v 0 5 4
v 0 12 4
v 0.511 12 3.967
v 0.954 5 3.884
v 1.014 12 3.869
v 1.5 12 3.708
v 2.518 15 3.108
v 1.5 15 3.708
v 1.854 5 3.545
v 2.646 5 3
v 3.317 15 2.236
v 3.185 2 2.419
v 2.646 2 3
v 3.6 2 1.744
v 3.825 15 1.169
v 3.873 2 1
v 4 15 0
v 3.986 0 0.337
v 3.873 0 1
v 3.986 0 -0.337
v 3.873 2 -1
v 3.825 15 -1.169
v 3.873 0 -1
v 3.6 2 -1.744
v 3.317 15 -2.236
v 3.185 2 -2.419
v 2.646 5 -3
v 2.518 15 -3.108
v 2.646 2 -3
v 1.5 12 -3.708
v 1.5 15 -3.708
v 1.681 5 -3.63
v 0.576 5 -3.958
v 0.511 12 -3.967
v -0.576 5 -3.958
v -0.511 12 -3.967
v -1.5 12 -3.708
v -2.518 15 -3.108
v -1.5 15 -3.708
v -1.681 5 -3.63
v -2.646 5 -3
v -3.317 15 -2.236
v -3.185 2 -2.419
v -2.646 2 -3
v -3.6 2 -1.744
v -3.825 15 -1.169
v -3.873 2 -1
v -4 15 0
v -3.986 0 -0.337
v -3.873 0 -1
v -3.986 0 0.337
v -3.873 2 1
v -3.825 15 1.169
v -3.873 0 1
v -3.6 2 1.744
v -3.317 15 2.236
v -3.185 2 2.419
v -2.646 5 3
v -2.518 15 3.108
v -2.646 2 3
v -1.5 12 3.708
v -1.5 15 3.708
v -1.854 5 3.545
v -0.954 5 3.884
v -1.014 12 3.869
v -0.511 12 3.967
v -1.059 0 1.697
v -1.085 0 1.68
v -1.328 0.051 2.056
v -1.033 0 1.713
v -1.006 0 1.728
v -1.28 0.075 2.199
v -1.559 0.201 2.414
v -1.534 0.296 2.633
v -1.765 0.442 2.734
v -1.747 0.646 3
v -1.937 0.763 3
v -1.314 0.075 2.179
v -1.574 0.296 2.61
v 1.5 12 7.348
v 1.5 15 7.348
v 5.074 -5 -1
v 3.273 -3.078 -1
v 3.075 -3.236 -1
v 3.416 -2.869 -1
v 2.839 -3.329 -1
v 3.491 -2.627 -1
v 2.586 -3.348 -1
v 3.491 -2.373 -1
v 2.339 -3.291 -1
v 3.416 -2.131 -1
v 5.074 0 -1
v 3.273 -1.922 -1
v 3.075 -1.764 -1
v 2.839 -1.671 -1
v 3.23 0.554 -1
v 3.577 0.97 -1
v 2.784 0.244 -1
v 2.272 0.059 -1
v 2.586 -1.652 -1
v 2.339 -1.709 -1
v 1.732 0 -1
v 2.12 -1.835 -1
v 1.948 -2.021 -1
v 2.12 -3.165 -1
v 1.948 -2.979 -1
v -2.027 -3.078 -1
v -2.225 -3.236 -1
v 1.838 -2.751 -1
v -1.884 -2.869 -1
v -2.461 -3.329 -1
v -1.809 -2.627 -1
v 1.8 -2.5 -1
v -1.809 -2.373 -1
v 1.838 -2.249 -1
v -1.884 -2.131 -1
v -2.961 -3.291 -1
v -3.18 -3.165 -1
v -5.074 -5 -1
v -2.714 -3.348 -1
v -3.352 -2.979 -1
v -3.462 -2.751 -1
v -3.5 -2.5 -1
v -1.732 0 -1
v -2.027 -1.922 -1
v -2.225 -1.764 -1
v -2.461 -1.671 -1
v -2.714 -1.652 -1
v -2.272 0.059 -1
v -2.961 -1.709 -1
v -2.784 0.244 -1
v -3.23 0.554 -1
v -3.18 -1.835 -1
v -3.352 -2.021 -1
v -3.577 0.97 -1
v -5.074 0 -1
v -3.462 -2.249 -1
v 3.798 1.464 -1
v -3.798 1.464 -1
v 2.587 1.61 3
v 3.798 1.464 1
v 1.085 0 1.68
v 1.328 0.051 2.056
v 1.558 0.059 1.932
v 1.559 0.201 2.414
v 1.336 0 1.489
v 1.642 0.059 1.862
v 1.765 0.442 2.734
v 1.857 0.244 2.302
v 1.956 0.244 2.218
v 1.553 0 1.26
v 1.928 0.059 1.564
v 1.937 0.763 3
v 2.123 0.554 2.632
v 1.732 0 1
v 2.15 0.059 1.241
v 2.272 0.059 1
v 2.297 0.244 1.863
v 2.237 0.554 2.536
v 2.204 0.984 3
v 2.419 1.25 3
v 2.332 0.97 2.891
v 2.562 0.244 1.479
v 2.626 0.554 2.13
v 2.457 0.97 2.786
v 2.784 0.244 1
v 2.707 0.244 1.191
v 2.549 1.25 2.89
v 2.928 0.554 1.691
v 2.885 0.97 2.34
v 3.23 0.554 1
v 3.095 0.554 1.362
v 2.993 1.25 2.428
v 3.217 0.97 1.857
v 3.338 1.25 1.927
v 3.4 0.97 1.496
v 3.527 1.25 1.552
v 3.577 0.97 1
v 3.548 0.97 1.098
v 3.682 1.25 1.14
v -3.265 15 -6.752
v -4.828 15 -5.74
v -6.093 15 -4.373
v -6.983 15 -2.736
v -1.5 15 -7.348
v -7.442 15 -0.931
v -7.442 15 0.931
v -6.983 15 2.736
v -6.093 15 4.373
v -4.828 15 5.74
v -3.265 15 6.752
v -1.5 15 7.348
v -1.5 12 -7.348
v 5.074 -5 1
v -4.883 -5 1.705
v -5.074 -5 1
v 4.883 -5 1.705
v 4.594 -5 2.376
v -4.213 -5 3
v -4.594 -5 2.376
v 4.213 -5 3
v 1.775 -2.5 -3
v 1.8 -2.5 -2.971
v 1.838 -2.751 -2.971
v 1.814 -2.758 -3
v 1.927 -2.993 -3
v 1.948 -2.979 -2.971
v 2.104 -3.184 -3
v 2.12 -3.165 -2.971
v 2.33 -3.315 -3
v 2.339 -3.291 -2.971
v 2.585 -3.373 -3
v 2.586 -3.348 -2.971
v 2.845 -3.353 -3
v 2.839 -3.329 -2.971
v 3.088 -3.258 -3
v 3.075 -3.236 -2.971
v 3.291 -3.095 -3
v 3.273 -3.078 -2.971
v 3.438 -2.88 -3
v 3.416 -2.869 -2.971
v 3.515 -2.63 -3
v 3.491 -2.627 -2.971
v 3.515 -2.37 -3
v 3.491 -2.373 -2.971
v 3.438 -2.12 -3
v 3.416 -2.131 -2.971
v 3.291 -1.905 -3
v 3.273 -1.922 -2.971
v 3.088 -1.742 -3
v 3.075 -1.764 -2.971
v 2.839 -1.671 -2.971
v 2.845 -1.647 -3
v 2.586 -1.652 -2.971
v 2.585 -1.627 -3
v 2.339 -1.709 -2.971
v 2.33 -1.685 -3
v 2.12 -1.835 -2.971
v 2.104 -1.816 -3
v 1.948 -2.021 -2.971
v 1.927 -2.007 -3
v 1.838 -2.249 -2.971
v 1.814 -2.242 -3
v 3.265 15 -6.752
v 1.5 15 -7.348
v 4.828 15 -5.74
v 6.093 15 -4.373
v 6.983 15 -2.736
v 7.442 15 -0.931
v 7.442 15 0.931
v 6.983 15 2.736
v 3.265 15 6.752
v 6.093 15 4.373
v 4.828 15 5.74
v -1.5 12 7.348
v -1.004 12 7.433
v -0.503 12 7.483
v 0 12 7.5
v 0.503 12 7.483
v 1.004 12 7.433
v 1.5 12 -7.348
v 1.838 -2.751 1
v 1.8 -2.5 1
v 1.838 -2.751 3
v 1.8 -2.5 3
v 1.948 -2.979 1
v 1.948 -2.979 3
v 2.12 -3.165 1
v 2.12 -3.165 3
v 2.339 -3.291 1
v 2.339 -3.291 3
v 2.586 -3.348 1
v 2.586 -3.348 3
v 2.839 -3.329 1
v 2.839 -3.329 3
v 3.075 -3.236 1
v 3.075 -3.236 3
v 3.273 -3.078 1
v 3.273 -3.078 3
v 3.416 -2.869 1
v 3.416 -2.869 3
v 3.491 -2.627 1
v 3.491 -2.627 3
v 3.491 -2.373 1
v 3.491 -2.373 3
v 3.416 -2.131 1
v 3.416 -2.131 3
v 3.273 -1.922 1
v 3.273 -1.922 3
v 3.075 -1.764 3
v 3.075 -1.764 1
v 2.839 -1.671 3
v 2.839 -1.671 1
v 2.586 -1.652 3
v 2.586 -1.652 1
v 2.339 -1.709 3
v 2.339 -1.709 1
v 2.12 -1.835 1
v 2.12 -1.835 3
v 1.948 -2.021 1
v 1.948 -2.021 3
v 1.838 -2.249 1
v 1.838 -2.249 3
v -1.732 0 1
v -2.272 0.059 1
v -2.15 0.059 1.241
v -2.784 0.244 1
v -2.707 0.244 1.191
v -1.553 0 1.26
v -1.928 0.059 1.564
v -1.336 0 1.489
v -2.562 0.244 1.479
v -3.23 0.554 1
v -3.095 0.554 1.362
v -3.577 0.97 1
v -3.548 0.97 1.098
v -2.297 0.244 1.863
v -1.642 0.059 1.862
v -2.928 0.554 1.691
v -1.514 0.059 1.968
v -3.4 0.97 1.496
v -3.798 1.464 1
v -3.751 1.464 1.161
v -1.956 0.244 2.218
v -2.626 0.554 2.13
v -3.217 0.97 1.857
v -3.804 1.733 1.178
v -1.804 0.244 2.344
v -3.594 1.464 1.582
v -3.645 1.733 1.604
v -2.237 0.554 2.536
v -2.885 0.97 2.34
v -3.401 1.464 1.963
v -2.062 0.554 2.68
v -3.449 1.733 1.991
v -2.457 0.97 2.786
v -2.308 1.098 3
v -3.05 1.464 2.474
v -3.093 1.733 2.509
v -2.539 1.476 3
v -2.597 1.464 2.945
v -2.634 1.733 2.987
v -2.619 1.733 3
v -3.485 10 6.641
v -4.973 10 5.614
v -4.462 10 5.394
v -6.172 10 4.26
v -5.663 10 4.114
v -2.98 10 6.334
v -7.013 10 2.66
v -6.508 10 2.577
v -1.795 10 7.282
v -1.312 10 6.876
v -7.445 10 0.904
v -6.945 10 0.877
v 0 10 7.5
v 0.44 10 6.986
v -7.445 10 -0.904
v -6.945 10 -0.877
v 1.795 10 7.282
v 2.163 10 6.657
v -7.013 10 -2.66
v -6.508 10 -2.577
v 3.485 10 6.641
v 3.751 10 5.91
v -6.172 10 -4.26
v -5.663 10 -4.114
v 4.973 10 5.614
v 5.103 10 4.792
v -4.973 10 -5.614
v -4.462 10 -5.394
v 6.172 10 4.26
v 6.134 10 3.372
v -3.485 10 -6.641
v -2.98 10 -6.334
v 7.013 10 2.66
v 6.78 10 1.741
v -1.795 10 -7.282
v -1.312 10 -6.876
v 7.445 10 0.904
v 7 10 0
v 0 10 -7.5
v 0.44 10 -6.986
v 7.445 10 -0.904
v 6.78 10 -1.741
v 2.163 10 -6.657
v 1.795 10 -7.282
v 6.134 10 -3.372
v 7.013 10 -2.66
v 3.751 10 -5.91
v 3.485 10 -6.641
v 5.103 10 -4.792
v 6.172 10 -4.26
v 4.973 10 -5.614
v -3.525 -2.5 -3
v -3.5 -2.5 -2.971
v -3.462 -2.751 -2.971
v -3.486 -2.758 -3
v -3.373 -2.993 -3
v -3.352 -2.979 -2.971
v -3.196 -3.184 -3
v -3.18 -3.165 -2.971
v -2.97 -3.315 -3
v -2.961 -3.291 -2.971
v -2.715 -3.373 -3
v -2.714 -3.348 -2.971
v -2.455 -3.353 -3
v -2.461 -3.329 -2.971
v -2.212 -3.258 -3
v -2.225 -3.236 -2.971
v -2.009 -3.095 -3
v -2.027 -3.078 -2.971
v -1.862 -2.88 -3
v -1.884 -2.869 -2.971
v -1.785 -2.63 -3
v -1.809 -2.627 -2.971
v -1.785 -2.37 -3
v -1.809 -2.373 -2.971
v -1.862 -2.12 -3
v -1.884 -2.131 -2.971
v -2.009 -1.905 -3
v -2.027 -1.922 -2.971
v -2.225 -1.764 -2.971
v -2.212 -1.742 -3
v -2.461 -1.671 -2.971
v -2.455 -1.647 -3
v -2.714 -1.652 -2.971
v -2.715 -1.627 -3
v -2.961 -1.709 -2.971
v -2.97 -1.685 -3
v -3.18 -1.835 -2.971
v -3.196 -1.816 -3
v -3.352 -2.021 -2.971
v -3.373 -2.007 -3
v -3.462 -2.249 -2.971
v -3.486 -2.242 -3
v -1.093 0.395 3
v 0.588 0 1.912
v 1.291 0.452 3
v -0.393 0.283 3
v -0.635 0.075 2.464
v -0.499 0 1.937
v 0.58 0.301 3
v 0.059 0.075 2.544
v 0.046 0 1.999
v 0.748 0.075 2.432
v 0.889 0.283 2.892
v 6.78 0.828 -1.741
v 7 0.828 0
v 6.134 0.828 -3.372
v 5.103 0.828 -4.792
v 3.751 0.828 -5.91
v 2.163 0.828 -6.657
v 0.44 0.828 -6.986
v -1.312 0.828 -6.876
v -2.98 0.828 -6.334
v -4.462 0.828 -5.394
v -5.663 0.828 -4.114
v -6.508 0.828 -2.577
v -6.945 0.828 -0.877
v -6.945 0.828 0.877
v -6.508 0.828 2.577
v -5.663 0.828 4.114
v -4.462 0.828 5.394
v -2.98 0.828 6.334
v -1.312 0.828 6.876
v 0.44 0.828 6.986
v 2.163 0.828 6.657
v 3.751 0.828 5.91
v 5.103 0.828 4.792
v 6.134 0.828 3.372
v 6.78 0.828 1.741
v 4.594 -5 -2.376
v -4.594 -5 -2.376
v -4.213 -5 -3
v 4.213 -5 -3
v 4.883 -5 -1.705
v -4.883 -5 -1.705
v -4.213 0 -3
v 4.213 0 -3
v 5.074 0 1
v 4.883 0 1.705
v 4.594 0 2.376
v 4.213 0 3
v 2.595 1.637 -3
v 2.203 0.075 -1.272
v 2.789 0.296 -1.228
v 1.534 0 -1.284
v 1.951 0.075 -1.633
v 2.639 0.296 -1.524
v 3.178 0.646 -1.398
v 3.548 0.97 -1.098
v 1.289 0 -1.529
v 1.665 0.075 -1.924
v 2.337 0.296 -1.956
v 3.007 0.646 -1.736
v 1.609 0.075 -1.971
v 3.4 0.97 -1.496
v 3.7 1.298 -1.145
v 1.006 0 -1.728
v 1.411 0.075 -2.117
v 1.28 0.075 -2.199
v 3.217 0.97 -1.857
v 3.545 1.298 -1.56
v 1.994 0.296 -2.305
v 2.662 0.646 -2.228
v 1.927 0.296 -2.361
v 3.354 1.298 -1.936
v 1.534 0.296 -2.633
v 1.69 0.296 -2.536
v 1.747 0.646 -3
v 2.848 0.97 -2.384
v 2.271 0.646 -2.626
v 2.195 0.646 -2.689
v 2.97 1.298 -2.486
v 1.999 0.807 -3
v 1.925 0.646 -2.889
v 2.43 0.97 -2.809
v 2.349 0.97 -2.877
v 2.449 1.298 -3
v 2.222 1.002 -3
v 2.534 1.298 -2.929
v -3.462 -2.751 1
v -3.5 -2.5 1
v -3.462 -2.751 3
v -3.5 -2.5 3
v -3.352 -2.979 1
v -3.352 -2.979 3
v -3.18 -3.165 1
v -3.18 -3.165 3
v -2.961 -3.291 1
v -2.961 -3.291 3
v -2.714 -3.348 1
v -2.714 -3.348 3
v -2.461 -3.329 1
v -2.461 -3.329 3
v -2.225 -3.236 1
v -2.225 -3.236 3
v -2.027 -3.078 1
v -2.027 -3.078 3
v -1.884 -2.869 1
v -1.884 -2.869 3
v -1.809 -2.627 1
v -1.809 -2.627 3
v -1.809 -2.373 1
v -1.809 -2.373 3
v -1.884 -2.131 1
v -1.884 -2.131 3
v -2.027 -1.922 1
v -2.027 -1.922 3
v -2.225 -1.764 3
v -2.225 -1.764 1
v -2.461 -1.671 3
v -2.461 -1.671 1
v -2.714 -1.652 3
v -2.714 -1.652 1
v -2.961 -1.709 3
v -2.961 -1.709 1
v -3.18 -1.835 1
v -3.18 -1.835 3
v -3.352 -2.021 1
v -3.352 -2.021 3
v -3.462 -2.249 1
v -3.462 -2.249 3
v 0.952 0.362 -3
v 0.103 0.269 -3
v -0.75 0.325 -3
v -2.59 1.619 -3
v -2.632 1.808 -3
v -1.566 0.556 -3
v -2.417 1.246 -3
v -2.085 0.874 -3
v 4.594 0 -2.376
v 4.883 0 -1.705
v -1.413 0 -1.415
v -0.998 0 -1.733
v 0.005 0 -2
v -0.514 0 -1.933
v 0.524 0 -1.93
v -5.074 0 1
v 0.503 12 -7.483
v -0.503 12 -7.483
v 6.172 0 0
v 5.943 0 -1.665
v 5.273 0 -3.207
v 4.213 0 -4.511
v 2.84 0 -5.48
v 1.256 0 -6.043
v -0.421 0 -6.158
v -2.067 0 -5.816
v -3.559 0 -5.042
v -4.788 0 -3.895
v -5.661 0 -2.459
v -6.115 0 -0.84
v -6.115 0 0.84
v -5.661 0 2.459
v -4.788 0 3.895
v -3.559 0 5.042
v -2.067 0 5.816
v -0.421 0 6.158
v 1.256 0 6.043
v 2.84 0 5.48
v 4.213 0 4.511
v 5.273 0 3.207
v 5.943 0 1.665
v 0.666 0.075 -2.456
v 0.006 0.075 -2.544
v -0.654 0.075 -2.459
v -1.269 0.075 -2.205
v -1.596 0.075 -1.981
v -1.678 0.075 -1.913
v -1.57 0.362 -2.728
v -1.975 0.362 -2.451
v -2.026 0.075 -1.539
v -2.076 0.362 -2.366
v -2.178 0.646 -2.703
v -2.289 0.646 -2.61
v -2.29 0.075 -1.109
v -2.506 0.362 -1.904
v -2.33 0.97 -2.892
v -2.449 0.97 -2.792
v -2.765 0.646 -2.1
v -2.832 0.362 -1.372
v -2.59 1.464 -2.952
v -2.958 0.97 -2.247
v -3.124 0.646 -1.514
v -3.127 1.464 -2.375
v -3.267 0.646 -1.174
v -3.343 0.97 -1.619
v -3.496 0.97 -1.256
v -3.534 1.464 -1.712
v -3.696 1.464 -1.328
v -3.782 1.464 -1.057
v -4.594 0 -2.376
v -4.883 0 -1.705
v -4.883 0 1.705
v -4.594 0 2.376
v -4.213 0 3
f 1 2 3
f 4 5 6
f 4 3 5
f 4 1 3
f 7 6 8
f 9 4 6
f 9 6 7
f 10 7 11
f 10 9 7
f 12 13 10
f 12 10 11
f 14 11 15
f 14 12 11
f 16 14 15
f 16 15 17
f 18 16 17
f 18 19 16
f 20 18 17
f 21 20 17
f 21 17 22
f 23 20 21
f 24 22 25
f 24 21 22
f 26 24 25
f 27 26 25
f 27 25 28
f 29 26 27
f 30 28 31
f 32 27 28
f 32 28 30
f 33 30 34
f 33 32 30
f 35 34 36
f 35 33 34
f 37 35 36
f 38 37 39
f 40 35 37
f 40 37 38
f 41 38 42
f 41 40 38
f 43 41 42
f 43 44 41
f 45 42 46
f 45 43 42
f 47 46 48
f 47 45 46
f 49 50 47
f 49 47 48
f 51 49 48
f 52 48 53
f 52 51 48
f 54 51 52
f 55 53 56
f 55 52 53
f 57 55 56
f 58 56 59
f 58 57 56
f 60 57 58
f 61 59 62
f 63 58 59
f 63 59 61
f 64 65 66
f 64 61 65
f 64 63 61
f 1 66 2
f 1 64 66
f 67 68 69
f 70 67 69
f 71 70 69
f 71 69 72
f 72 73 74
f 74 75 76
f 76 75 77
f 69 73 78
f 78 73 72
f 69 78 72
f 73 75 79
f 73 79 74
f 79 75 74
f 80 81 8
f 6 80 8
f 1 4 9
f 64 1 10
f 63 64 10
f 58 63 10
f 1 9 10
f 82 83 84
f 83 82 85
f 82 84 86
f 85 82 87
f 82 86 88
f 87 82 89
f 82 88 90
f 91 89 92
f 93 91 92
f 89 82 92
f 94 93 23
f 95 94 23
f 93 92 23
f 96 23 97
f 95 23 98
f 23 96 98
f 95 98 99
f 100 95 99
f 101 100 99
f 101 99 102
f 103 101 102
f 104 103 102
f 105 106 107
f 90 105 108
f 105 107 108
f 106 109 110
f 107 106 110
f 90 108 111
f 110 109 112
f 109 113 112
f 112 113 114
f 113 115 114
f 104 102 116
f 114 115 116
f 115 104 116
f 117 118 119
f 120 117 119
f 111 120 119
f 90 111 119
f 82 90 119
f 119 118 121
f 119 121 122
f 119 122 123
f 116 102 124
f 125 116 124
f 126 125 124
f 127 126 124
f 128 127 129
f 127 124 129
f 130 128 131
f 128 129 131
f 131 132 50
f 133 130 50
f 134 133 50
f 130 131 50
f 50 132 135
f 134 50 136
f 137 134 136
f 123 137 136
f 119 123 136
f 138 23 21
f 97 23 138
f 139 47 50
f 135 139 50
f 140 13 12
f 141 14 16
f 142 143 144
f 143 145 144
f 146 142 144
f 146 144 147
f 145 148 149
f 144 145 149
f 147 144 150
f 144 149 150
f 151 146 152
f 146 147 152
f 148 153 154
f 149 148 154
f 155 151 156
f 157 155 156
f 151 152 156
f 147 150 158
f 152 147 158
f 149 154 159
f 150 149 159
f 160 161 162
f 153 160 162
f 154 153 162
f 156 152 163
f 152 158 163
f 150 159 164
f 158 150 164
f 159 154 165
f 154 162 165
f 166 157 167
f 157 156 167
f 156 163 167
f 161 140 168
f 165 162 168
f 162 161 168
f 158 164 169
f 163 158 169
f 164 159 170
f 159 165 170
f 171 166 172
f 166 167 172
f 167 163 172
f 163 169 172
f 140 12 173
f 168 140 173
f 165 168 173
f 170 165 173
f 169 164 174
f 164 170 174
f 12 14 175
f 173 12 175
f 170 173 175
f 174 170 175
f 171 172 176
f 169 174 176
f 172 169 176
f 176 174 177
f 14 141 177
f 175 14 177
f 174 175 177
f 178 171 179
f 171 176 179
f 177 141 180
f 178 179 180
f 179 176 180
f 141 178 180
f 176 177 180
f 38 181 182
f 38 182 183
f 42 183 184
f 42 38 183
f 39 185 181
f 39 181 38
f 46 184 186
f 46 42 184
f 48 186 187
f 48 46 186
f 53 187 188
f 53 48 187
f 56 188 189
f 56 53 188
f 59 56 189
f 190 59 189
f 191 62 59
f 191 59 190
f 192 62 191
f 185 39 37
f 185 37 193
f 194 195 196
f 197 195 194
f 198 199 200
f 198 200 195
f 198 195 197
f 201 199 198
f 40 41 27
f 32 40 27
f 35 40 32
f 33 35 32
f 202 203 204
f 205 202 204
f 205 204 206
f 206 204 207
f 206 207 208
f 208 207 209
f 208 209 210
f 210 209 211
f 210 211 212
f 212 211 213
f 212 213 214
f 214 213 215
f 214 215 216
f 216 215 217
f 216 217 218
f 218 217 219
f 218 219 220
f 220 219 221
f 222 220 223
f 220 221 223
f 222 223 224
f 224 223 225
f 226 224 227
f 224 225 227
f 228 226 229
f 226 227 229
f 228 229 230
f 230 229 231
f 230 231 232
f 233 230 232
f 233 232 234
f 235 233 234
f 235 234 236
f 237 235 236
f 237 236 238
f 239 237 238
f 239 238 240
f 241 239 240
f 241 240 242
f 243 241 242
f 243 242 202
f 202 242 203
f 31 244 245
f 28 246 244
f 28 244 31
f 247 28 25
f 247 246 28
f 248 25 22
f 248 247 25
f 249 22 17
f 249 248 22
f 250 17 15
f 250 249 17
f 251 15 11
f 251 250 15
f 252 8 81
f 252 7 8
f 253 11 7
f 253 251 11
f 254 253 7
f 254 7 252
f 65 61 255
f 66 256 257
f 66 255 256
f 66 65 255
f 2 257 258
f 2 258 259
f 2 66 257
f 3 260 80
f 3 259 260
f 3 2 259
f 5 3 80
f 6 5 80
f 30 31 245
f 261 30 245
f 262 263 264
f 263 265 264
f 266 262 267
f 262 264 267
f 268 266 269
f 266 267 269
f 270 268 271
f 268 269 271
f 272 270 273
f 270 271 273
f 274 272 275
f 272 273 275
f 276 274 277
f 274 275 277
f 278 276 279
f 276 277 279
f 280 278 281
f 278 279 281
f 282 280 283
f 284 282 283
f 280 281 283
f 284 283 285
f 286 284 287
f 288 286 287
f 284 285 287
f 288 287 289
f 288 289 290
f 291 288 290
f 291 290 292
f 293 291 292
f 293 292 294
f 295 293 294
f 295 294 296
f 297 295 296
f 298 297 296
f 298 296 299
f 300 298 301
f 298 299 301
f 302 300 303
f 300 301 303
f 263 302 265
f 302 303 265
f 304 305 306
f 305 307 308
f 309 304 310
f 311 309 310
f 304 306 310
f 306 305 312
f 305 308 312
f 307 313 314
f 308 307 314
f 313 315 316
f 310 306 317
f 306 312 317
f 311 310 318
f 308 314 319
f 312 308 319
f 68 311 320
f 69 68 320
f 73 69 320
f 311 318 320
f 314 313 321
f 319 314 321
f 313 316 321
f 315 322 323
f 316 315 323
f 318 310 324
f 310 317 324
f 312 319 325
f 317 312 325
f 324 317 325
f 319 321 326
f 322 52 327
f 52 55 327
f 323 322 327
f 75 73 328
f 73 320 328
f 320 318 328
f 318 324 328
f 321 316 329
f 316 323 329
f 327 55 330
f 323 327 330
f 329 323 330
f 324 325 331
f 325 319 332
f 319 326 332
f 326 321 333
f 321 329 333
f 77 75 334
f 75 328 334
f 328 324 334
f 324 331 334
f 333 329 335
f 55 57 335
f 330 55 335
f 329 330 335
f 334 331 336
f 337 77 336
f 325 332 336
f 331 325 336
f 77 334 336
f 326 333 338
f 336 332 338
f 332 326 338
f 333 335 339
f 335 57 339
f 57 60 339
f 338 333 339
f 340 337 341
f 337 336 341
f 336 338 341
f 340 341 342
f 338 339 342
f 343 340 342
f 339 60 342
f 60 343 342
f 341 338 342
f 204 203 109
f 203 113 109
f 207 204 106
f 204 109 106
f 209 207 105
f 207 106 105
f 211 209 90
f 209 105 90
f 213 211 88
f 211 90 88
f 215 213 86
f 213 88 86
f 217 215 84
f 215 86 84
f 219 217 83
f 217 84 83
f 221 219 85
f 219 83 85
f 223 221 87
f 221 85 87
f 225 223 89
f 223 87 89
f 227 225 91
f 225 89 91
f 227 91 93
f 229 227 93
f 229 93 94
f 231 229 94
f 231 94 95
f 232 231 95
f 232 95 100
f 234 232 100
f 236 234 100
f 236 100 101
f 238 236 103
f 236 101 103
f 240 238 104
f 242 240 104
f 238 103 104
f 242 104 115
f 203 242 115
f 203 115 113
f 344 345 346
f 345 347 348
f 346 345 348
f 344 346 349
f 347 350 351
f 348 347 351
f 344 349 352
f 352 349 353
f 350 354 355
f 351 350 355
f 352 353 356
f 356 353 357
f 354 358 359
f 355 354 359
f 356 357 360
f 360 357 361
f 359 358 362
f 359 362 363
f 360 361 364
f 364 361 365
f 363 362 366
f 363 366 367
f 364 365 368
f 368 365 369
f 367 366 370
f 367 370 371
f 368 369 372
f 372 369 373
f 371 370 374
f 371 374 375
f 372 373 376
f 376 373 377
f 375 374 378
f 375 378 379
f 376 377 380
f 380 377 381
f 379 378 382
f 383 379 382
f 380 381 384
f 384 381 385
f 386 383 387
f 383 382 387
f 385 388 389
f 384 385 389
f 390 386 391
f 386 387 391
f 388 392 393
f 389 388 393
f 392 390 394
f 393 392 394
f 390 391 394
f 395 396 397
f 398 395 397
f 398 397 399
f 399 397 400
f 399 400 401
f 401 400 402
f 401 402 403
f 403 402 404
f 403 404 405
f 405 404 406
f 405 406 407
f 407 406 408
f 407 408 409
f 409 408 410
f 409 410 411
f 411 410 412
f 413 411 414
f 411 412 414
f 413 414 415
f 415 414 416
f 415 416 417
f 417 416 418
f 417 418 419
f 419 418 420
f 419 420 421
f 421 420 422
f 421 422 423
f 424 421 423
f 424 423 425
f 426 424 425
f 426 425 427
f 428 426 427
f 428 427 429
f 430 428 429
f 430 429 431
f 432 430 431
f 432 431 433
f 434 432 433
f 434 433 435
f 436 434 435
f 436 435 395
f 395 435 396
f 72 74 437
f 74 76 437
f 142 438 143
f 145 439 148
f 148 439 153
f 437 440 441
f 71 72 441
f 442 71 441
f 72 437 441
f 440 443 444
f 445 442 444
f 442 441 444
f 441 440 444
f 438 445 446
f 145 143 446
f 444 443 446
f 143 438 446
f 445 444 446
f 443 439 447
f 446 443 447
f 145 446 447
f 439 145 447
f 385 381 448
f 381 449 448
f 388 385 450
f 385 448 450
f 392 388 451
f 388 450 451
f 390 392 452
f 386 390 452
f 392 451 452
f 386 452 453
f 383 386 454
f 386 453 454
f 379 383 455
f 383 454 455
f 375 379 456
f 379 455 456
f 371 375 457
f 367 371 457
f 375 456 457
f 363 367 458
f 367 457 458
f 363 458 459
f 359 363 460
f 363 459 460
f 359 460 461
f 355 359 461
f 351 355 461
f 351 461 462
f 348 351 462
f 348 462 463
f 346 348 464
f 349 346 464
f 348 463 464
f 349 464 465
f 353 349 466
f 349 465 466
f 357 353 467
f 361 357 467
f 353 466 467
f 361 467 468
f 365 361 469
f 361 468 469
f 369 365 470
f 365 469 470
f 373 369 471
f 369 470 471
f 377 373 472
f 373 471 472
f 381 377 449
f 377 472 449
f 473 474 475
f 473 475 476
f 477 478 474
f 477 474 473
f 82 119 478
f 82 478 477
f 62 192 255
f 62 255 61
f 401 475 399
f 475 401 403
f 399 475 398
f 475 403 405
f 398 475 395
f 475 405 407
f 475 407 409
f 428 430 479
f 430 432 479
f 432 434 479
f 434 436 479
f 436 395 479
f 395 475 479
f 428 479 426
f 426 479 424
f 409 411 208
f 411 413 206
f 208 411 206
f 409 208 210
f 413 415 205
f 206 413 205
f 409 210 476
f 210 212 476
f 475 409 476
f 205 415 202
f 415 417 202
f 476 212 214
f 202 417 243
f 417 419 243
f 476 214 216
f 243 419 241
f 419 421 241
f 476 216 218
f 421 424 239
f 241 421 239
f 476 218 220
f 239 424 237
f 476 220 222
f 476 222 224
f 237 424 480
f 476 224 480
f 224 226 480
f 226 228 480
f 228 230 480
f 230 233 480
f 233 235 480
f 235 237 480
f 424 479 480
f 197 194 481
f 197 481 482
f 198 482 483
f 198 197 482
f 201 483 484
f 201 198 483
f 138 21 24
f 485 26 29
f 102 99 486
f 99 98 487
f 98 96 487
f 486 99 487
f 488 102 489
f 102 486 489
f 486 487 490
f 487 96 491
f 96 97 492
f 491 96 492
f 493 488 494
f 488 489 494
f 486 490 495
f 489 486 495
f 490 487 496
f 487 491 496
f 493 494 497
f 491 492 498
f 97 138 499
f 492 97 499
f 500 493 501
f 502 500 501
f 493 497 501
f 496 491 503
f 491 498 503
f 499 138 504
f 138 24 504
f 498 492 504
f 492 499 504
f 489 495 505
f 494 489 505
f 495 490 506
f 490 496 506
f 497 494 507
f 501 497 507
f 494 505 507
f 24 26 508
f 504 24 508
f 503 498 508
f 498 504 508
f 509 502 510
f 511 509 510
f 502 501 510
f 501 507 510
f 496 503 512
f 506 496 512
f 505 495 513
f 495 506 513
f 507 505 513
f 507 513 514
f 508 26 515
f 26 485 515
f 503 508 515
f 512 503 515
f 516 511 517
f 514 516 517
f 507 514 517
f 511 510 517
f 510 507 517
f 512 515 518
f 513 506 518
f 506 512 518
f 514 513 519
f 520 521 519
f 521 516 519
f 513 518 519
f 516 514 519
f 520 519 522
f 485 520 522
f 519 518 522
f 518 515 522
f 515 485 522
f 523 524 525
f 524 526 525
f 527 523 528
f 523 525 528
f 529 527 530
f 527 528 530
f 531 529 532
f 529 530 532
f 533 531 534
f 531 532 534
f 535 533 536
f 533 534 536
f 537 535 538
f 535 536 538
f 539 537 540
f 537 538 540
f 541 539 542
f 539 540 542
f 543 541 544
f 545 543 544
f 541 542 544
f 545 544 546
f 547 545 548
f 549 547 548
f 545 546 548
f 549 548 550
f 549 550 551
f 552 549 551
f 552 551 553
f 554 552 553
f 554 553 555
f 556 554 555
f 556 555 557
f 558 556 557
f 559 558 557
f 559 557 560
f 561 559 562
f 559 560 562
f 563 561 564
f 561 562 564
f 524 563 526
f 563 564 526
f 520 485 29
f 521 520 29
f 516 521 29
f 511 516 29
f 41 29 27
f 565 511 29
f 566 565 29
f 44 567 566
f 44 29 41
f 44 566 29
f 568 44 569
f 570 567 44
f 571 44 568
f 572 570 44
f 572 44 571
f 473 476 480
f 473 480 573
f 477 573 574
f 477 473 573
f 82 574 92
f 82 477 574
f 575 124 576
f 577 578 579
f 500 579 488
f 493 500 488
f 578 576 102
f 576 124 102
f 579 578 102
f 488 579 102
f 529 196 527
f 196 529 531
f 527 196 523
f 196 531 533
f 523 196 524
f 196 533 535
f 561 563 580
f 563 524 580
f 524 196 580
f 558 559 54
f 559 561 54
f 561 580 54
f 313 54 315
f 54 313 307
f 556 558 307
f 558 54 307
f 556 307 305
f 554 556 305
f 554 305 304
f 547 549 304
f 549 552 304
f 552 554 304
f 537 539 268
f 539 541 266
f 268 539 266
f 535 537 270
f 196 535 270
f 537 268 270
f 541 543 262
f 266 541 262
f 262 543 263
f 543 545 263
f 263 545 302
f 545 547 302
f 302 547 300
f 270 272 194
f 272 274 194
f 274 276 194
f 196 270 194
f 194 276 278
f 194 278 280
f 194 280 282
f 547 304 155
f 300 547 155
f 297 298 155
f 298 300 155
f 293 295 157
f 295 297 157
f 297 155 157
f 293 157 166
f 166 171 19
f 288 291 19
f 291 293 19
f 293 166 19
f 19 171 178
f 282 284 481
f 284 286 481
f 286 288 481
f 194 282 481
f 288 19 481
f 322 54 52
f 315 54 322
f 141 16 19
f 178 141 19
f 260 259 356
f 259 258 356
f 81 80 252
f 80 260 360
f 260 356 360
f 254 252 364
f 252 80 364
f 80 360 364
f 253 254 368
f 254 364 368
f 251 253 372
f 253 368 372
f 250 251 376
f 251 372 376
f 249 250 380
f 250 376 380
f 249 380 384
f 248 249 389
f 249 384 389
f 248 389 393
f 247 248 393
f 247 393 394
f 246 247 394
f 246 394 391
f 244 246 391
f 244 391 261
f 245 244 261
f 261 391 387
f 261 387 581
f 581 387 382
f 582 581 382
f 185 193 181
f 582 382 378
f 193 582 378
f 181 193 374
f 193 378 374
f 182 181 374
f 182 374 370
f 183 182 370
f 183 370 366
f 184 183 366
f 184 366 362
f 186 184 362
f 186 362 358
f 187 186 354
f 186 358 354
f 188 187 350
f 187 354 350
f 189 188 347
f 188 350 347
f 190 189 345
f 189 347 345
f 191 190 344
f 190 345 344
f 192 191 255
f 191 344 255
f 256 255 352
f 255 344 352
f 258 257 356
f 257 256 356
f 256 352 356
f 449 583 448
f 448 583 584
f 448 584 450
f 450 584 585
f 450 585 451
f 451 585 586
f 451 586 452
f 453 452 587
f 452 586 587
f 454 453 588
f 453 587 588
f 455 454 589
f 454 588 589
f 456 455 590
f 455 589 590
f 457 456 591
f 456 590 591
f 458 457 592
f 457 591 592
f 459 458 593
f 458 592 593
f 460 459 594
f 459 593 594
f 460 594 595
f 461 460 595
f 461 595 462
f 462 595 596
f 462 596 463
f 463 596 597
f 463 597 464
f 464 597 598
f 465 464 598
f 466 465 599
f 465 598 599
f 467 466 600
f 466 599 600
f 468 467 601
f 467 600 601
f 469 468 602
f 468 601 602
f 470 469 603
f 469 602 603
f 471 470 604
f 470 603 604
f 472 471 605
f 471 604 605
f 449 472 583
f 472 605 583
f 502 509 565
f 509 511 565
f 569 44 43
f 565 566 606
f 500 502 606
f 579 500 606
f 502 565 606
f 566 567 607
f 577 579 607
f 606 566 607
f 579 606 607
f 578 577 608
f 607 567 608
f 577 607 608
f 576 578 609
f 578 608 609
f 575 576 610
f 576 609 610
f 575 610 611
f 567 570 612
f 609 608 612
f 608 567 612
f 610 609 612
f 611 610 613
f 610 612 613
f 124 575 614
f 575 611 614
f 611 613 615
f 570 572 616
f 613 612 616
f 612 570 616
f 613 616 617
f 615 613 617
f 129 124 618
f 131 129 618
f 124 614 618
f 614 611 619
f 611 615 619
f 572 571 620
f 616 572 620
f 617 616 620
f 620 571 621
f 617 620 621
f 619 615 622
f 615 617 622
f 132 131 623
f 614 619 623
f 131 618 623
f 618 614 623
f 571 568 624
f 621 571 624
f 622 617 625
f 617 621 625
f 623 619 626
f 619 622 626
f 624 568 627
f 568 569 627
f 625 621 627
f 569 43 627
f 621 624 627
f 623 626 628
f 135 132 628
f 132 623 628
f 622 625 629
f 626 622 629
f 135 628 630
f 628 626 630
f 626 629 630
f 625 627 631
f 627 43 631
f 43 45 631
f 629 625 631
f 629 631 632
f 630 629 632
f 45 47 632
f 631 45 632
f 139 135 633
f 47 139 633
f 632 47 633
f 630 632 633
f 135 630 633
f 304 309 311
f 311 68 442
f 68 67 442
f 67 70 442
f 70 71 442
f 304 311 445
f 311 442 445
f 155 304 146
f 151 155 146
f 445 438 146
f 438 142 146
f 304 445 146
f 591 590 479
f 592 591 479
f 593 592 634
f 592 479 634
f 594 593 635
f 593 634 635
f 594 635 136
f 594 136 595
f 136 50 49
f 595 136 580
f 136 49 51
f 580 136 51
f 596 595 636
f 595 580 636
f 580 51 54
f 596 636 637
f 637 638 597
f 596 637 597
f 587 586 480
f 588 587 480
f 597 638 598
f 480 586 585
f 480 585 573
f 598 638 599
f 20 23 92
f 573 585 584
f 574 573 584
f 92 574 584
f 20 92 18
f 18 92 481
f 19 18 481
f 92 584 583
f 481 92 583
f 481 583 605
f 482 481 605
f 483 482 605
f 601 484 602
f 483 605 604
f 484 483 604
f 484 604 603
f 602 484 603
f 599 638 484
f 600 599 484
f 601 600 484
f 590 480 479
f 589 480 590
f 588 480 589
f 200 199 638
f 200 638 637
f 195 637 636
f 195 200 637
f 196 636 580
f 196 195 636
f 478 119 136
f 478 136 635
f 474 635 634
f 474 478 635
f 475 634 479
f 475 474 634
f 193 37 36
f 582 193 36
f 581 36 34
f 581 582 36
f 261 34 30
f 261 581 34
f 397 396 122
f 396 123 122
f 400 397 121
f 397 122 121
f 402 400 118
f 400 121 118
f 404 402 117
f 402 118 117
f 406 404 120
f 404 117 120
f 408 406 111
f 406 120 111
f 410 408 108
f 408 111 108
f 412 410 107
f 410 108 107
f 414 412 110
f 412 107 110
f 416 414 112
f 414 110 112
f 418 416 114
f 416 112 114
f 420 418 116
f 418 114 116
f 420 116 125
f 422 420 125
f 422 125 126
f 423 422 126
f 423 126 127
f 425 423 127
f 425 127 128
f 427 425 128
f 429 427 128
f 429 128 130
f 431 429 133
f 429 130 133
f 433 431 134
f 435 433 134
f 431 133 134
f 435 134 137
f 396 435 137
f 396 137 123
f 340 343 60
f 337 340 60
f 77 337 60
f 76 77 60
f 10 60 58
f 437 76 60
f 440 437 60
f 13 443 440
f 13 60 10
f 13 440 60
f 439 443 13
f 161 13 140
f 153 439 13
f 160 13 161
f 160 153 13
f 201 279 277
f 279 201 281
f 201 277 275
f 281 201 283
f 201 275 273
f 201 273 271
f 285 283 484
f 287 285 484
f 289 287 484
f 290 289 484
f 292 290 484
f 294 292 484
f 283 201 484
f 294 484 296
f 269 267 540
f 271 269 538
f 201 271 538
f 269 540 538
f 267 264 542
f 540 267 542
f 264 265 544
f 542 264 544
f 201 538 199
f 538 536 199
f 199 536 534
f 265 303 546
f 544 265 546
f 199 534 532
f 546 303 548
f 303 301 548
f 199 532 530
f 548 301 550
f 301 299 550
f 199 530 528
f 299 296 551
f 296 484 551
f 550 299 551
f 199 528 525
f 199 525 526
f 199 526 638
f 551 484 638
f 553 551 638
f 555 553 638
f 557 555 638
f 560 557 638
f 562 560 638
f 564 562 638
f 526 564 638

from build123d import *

# Parameters (mm, degrees)
CROQUIS1_R                               = 7.5
CROQUIS1_R_2                             = 4
SALIENTE_EXTRUIR1_DEPTH                  = 15
CROQUIS2_W                               = 3
CROQUIS2_H                               = 16.302446726
CORTAR_EXTRUIR1_DEPTH                    = 3
SALIENTE_EXTRUIR2_START                  = 5
SALIENTE_EXTRUIR2_DEPTH                  = 5
TALADRO_DE_MARGEN_PARA_M1_61_D           = 1.7
TALADRO_DE_MARGEN_PARA_M1_61_CSINK_D     = 1.75
TALADRO_DE_MARGEN_PARA_M1_61_CSINK_ANGLE = 82
REDONDEO1_R                              = 2
SALIENTE_EXTRUIR3_DEPTH                  = 5


# Read off the part's stored shape, not the designer's step: M14x1.5 Roscas Standard Taladro1
with BuildPart() as part:
    # Croquis1 → Saliente-Extruir1 (new body)
    with BuildSketch(Plane(origin=(0, 0, 0), x_dir=(1, 0, 0), z_dir=(0, 1, 0))):
        with Locations(Location((0, 0, 0), (0, 0, 270))):
            Circle(CROQUIS1_R)
        with Locations(Location((0, 0, 0), (0, 0, 270))):
            Circle(CROQUIS1_R_2, mode=Mode.SUBTRACT)
    extrude(amount=SALIENTE_EXTRUIR1_DEPTH)

    # Croquis2 → Cortar-Extruir1 (cut)
    with BuildSketch(Plane(origin=(0, 15, 0), x_dir=(1, 0, 0), z_dir=(0, 1, 0))):
        Rectangle(CROQUIS2_W, CROQUIS2_H)
    extrude(amount=-CORTAR_EXTRUIR1_DEPTH, mode=Mode.SUBTRACT)

    # M14x1.5 Roscas Standard Taladro1 outline → M14x1.5 Roscas Standard Taladro1 (revolve, cut)
    with BuildSketch(Plane.XY):
        Polygon((6.172, 0), (7.5, 0), (7.5, 10), (7, 10), (7, 0.828), align=None)
    revolve(axis=Axis((0, 0, 0), (0, 1, 0)), mode=Mode.SUBTRACT)

    # Croquis4 → Saliente-Extruir2 (add)
    with BuildSketch(Plane.XZ.offset(SALIENTE_EXTRUIR2_START)):
        with BuildLine():
            ThreePointArc((2.645751311, -3), (3.409321836, -2.092014488), (3.872983346, -1))
            Line((3.872983346, -1), (-3.872983346, -1))
            ThreePointArc((-3.872983346, -1), (-3.409321836, -2.092014488), (-2.645751311, -3))
            Line((-2.645751311, -3), (2.645751311, -3))
        make_face()
        with BuildLine():
            Line((-3.872983346, 1), (3.872983346, 1))
            ThreePointArc((3.872983346, 1), (3.409321836, 2.092014488), (2.645751311, 3))
            Line((2.645751311, 3), (-2.645751311, 3))
            ThreePointArc((-2.645751311, 3), (-3.409321836, 2.092014488), (-3.872983346, 1))
        make_face()
        with BuildLine():
            Line((3.872983346, 1), (5.074404793, 1))
            ThreePointArc((5.074404793, 1), (4.750167411, 2.045847884), (4.213025516, 3))
            Line((4.213025516, 3), (2.645751311, 3))
            ThreePointArc((2.645751311, 3), (3.409321836, 2.092014488), (3.872983346, 1))
        make_face()
        with BuildLine():
            Line((-5.074404793, 1), (-3.872983346, 1))
            ThreePointArc((-3.872983346, 1), (-3.409321836, 2.092014488), (-2.645751311, 3))
            Line((-2.645751311, 3), (-4.213025516, 3))
            ThreePointArc((-4.213025516, 3), (-4.750167411, 2.045847884), (-5.074404793, 1))
        make_face()
        with BuildLine():
            ThreePointArc((4.213025516, -3), (4.750167411, -2.045847884), (5.074404793, -1))
            Line((5.074404793, -1), (3.872983346, -1))
            ThreePointArc((3.872983346, -1), (3.409321836, -2.092014488), (2.645751311, -3))
            Line((2.645751311, -3), (4.213025516, -3))
        make_face()
        with BuildLine():
            ThreePointArc((-2.645751311, -3), (-3.409321836, -2.092014488), (-3.872983346, -1))
            Line((-3.872983346, -1), (-5.074404793, -1))
            ThreePointArc((-5.074404793, -1), (-4.750167411, -2.045847884), (-4.213025516, -3))
            Line((-4.213025516, -3), (-2.645751311, -3))
        make_face()
    extrude(amount=-SALIENTE_EXTRUIR2_DEPTH)

    # Taladro de margen para M1.61 (through all)
    with Locations(Plane(origin=(0, 0, -3), x_dir=(1, 0, 0), z_dir=(0, 0, -1))):
        with Locations((2.65, 2.5), (-2.65, 2.5)):
            CounterSinkHole(TALADRO_DE_MARGEN_PARA_M1_61_D / 2, TALADRO_DE_MARGEN_PARA_M1_61_CSINK_D / 2, counter_sink_angle=TALADRO_DE_MARGEN_PARA_M1_61_CSINK_ANGLE)

    # Redondeo1
    # the kernel refuses this fillet: 2 mm, written as the material it adds along each edge
    with BuildSketch(Plane(origin=(0, 0, 0), x_dir=(0.503234651569935, 0, -0.8641498049871251), z_dir=(0.8641498049871251, 0, 0.503234651569935))) as redondeo1_piece_1_section:
        with BuildLine():
            CenterArc((4 - REDONDEO1_R, REDONDEO1_R), REDONDEO1_R, 270, 90)
            Line((4 - REDONDEO1_R, 0), (4, 0))
            Line((4, 0), (4, REDONDEO1_R))
        make_face()
    redondeo1_piece_1 = revolve(axis=Axis((0, 0, 0), (0, 1, 0)), revolution_arc=177.360579055, mode=Mode.PRIVATE)
    redondeo1_piece_1 = split(redondeo1_piece_1, bisect_by=Plane(origin=(0.549602468, 0.055077536, -1), z_dir=(0, 0, -1)), keep=Keep.TOP, mode=Mode.PRIVATE)
    redondeo1_piece_1 = split(redondeo1_piece_1, bisect_by=Plane(origin=(0.549602468, 0.055077536, -3), z_dir=(0, 0, 1)), keep=Keep.TOP, mode=Mode.PRIVATE)
    add(redondeo1_piece_1)
    with BuildSketch(Plane(origin=(0, 0, 0), x_dir=(0.503234651569935, 0, -0.8641498049871251), z_dir=(0.8641498049871251, 0, 0.503234651569935))) as redondeo1_piece_2_section:
        with BuildLine():
            CenterArc((4 - REDONDEO1_R, REDONDEO1_R), REDONDEO1_R, 270, 90)
            Line((4 - REDONDEO1_R, 0), (4, 0))
            Line((4, 0), (4, REDONDEO1_R))
        make_face()
    redondeo1_piece_2 = revolve(axis=Axis((0, 0, 0), (0, 1, 0)), revolution_arc=177.360579055, mode=Mode.PRIVATE)
    redondeo1_piece_2 = split(redondeo1_piece_2, bisect_by=Plane(origin=(-2.883008057, 0.461894683, 3), z_dir=(0, 0, -1)), keep=Keep.TOP, mode=Mode.PRIVATE)
    redondeo1_piece_2 = split(redondeo1_piece_2, bisect_by=Plane(origin=(-2.883008057, 0.461894683, 1), z_dir=(0, 0, 1)), keep=Keep.TOP, mode=Mode.PRIVATE)
    add(redondeo1_piece_2)
    with BuildSketch(Plane(origin=(0, 0, 0), x_dir=(0.5424951341174628, 0, 0.8400589440383789), z_dir=(-0.8400589440383789, 0, 0.5424951341174628))) as redondeo1_piece_3_section:
        with BuildLine():
            CenterArc((4 - REDONDEO1_R, REDONDEO1_R), REDONDEO1_R, 270, 90)
            Line((4 - REDONDEO1_R, 0), (4, 0))
            Line((4, 0), (4, REDONDEO1_R))
        make_face()
    redondeo1_piece_3 = revolve(axis=Axis((0, 0, 0), (0, 1, 0)), revolution_arc=177.360579055, mode=Mode.PRIVATE)
    redondeo1_piece_3 = split(redondeo1_piece_3, bisect_by=Plane(origin=(2.883008085, 0.461894764, 3), z_dir=(0, 0, -1)), keep=Keep.TOP, mode=Mode.PRIVATE)
    redondeo1_piece_3 = split(redondeo1_piece_3, bisect_by=Plane(origin=(2.883008085, 0.461894764, 1), z_dir=(0, 0, 1)), keep=Keep.TOP, mode=Mode.PRIVATE)
    add(redondeo1_piece_3)
    with BuildSketch(Plane(origin=(0, 0, 0), x_dir=(0.5424951341174628, 0, 0.8400589440383789), z_dir=(-0.8400589440383789, 0, 0.5424951341174628))) as redondeo1_piece_4_section:
        with BuildLine():
            CenterArc((4 - REDONDEO1_R, REDONDEO1_R), REDONDEO1_R, 270, 90)
            Line((4 - REDONDEO1_R, 0), (4, 0))
            Line((4, 0), (4, REDONDEO1_R))
        make_face()
    redondeo1_piece_4 = revolve(axis=Axis((0, 0, 0), (0, 1, 0)), revolution_arc=177.360579055, mode=Mode.PRIVATE)
    redondeo1_piece_4 = split(redondeo1_piece_4, bisect_by=Plane(origin=(3.341819362, 1.478859592, -1), z_dir=(0, 0, -1)), keep=Keep.TOP, mode=Mode.PRIVATE)
    redondeo1_piece_4 = split(redondeo1_piece_4, bisect_by=Plane(origin=(3.341819362, 1.478859592, -3), z_dir=(0, 0, 1)), keep=Keep.TOP, mode=Mode.PRIVATE)
    add(redondeo1_piece_4)
    with BuildSketch(Plane(origin=(0, 0, 0), x_dir=(-0.5032346515699374, 0, 0.8641498049871236), z_dir=(-0.8641498049871236, 0, -0.5032346515699374))) as redondeo1_piece_5_section:
        with BuildLine():
            CenterArc((4 - REDONDEO1_R, REDONDEO1_R), REDONDEO1_R, 270, 90)
            Line((4 - REDONDEO1_R, 0), (4, 0))
            Line((4, 0), (4, REDONDEO1_R))
        make_face()
    redondeo1_piece_5 = revolve(axis=Axis((0, 0, 0), (0, 1, 0)), revolution_arc=177.360579055, mode=Mode.PRIVATE)
    redondeo1_piece_5 = split(redondeo1_piece_5, bisect_by=Plane(origin=(-0.549602468, 0.055077536, 3), z_dir=(0, 0, -1)), keep=Keep.TOP, mode=Mode.PRIVATE)
    redondeo1_piece_5 = split(redondeo1_piece_5, bisect_by=Plane(origin=(-0.549602468, 0.055077536, 1), z_dir=(0, 0, 1)), keep=Keep.TOP, mode=Mode.PRIVATE)
    add(redondeo1_piece_5)
    with BuildSketch(Plane(origin=(0, 0, 0), x_dir=(-0.5032346515699374, 0, 0.8641498049871236), z_dir=(-0.8641498049871236, 0, -0.5032346515699374))) as redondeo1_piece_6_section:
        with BuildLine():
            CenterArc((4 - REDONDEO1_R, REDONDEO1_R), REDONDEO1_R, 270, 90)
            Line((4 - REDONDEO1_R, 0), (4, 0))
            Line((4, 0), (4, REDONDEO1_R))
        make_face()
    redondeo1_piece_6 = revolve(axis=Axis((0, 0, 0), (0, 1, 0)), revolution_arc=177.360579055, mode=Mode.PRIVATE)
    redondeo1_piece_6 = split(redondeo1_piece_6, bisect_by=Plane(origin=(2.883008057, 0.461894683, -1), z_dir=(0, 0, -1)), keep=Keep.TOP, mode=Mode.PRIVATE)
    redondeo1_piece_6 = split(redondeo1_piece_6, bisect_by=Plane(origin=(2.883008057, 0.461894683, -3), z_dir=(0, 0, 1)), keep=Keep.TOP, mode=Mode.PRIVATE)
    add(redondeo1_piece_6)
    with BuildSketch(Plane(origin=(0, 0, 0), x_dir=(-0.542495134117437, 0, -0.8400589440383955), z_dir=(0.8400589440383955, 0, -0.542495134117437))) as redondeo1_piece_7_section:
        with BuildLine():
            CenterArc((4 - REDONDEO1_R, REDONDEO1_R), REDONDEO1_R, 270, 90)
            Line((4 - REDONDEO1_R, 0), (4, 0))
            Line((4, 0), (4, REDONDEO1_R))
        make_face()
    redondeo1_piece_7 = revolve(axis=Axis((0, 0, 0), (0, 1, 0)), revolution_arc=177.360579055, mode=Mode.PRIVATE)
    redondeo1_piece_7 = split(redondeo1_piece_7, bisect_by=Plane(origin=(-2.883008085, 0.461894764, -1), z_dir=(0, 0, -1)), keep=Keep.TOP, mode=Mode.PRIVATE)
    redondeo1_piece_7 = split(redondeo1_piece_7, bisect_by=Plane(origin=(-2.883008085, 0.461894764, -3), z_dir=(0, 0, 1)), keep=Keep.TOP, mode=Mode.PRIVATE)
    add(redondeo1_piece_7)
    with BuildSketch(Plane(origin=(0, 0, 0), x_dir=(-0.542495134117437, 0, -0.8400589440383955), z_dir=(0.8400589440383955, 0, -0.542495134117437))) as redondeo1_piece_8_section:
        with BuildLine():
            CenterArc((4 - REDONDEO1_R, REDONDEO1_R), REDONDEO1_R, 270, 90)
            Line((4 - REDONDEO1_R, 0), (4, 0))
            Line((4, 0), (4, REDONDEO1_R))
        make_face()
    redondeo1_piece_8 = revolve(axis=Axis((0, 0, 0), (0, 1, 0)), revolution_arc=177.360579055, mode=Mode.PRIVATE)
    redondeo1_piece_8 = split(redondeo1_piece_8, bisect_by=Plane(origin=(-3.341819362, 1.478859592, 3), z_dir=(0, 0, -1)), keep=Keep.TOP, mode=Mode.PRIVATE)
    redondeo1_piece_8 = split(redondeo1_piece_8, bisect_by=Plane(origin=(-3.341819362, 1.478859592, 1), z_dir=(0, 0, 1)), keep=Keep.TOP, mode=Mode.PRIVATE)
    add(redondeo1_piece_8)

    # Croquis10 → Saliente-Extruir3 (add)
    with BuildSketch(Plane.XZ):
        with BuildLine():
            ThreePointArc((2.645751311, 3), (0, 4), (-2.645751311, 3))
            Line((-2.645751311, 3), (2.645751311, 3))
        make_face()
        with BuildLine():
            ThreePointArc((-2.645751311, -3), (0, -4), (2.645751311, -3))
            Line((2.645751311, -3), (-2.645751311, -3))
        make_face()
    extrude(amount=-SALIENTE_EXTRUIR3_DEPTH)


solid = part.part
